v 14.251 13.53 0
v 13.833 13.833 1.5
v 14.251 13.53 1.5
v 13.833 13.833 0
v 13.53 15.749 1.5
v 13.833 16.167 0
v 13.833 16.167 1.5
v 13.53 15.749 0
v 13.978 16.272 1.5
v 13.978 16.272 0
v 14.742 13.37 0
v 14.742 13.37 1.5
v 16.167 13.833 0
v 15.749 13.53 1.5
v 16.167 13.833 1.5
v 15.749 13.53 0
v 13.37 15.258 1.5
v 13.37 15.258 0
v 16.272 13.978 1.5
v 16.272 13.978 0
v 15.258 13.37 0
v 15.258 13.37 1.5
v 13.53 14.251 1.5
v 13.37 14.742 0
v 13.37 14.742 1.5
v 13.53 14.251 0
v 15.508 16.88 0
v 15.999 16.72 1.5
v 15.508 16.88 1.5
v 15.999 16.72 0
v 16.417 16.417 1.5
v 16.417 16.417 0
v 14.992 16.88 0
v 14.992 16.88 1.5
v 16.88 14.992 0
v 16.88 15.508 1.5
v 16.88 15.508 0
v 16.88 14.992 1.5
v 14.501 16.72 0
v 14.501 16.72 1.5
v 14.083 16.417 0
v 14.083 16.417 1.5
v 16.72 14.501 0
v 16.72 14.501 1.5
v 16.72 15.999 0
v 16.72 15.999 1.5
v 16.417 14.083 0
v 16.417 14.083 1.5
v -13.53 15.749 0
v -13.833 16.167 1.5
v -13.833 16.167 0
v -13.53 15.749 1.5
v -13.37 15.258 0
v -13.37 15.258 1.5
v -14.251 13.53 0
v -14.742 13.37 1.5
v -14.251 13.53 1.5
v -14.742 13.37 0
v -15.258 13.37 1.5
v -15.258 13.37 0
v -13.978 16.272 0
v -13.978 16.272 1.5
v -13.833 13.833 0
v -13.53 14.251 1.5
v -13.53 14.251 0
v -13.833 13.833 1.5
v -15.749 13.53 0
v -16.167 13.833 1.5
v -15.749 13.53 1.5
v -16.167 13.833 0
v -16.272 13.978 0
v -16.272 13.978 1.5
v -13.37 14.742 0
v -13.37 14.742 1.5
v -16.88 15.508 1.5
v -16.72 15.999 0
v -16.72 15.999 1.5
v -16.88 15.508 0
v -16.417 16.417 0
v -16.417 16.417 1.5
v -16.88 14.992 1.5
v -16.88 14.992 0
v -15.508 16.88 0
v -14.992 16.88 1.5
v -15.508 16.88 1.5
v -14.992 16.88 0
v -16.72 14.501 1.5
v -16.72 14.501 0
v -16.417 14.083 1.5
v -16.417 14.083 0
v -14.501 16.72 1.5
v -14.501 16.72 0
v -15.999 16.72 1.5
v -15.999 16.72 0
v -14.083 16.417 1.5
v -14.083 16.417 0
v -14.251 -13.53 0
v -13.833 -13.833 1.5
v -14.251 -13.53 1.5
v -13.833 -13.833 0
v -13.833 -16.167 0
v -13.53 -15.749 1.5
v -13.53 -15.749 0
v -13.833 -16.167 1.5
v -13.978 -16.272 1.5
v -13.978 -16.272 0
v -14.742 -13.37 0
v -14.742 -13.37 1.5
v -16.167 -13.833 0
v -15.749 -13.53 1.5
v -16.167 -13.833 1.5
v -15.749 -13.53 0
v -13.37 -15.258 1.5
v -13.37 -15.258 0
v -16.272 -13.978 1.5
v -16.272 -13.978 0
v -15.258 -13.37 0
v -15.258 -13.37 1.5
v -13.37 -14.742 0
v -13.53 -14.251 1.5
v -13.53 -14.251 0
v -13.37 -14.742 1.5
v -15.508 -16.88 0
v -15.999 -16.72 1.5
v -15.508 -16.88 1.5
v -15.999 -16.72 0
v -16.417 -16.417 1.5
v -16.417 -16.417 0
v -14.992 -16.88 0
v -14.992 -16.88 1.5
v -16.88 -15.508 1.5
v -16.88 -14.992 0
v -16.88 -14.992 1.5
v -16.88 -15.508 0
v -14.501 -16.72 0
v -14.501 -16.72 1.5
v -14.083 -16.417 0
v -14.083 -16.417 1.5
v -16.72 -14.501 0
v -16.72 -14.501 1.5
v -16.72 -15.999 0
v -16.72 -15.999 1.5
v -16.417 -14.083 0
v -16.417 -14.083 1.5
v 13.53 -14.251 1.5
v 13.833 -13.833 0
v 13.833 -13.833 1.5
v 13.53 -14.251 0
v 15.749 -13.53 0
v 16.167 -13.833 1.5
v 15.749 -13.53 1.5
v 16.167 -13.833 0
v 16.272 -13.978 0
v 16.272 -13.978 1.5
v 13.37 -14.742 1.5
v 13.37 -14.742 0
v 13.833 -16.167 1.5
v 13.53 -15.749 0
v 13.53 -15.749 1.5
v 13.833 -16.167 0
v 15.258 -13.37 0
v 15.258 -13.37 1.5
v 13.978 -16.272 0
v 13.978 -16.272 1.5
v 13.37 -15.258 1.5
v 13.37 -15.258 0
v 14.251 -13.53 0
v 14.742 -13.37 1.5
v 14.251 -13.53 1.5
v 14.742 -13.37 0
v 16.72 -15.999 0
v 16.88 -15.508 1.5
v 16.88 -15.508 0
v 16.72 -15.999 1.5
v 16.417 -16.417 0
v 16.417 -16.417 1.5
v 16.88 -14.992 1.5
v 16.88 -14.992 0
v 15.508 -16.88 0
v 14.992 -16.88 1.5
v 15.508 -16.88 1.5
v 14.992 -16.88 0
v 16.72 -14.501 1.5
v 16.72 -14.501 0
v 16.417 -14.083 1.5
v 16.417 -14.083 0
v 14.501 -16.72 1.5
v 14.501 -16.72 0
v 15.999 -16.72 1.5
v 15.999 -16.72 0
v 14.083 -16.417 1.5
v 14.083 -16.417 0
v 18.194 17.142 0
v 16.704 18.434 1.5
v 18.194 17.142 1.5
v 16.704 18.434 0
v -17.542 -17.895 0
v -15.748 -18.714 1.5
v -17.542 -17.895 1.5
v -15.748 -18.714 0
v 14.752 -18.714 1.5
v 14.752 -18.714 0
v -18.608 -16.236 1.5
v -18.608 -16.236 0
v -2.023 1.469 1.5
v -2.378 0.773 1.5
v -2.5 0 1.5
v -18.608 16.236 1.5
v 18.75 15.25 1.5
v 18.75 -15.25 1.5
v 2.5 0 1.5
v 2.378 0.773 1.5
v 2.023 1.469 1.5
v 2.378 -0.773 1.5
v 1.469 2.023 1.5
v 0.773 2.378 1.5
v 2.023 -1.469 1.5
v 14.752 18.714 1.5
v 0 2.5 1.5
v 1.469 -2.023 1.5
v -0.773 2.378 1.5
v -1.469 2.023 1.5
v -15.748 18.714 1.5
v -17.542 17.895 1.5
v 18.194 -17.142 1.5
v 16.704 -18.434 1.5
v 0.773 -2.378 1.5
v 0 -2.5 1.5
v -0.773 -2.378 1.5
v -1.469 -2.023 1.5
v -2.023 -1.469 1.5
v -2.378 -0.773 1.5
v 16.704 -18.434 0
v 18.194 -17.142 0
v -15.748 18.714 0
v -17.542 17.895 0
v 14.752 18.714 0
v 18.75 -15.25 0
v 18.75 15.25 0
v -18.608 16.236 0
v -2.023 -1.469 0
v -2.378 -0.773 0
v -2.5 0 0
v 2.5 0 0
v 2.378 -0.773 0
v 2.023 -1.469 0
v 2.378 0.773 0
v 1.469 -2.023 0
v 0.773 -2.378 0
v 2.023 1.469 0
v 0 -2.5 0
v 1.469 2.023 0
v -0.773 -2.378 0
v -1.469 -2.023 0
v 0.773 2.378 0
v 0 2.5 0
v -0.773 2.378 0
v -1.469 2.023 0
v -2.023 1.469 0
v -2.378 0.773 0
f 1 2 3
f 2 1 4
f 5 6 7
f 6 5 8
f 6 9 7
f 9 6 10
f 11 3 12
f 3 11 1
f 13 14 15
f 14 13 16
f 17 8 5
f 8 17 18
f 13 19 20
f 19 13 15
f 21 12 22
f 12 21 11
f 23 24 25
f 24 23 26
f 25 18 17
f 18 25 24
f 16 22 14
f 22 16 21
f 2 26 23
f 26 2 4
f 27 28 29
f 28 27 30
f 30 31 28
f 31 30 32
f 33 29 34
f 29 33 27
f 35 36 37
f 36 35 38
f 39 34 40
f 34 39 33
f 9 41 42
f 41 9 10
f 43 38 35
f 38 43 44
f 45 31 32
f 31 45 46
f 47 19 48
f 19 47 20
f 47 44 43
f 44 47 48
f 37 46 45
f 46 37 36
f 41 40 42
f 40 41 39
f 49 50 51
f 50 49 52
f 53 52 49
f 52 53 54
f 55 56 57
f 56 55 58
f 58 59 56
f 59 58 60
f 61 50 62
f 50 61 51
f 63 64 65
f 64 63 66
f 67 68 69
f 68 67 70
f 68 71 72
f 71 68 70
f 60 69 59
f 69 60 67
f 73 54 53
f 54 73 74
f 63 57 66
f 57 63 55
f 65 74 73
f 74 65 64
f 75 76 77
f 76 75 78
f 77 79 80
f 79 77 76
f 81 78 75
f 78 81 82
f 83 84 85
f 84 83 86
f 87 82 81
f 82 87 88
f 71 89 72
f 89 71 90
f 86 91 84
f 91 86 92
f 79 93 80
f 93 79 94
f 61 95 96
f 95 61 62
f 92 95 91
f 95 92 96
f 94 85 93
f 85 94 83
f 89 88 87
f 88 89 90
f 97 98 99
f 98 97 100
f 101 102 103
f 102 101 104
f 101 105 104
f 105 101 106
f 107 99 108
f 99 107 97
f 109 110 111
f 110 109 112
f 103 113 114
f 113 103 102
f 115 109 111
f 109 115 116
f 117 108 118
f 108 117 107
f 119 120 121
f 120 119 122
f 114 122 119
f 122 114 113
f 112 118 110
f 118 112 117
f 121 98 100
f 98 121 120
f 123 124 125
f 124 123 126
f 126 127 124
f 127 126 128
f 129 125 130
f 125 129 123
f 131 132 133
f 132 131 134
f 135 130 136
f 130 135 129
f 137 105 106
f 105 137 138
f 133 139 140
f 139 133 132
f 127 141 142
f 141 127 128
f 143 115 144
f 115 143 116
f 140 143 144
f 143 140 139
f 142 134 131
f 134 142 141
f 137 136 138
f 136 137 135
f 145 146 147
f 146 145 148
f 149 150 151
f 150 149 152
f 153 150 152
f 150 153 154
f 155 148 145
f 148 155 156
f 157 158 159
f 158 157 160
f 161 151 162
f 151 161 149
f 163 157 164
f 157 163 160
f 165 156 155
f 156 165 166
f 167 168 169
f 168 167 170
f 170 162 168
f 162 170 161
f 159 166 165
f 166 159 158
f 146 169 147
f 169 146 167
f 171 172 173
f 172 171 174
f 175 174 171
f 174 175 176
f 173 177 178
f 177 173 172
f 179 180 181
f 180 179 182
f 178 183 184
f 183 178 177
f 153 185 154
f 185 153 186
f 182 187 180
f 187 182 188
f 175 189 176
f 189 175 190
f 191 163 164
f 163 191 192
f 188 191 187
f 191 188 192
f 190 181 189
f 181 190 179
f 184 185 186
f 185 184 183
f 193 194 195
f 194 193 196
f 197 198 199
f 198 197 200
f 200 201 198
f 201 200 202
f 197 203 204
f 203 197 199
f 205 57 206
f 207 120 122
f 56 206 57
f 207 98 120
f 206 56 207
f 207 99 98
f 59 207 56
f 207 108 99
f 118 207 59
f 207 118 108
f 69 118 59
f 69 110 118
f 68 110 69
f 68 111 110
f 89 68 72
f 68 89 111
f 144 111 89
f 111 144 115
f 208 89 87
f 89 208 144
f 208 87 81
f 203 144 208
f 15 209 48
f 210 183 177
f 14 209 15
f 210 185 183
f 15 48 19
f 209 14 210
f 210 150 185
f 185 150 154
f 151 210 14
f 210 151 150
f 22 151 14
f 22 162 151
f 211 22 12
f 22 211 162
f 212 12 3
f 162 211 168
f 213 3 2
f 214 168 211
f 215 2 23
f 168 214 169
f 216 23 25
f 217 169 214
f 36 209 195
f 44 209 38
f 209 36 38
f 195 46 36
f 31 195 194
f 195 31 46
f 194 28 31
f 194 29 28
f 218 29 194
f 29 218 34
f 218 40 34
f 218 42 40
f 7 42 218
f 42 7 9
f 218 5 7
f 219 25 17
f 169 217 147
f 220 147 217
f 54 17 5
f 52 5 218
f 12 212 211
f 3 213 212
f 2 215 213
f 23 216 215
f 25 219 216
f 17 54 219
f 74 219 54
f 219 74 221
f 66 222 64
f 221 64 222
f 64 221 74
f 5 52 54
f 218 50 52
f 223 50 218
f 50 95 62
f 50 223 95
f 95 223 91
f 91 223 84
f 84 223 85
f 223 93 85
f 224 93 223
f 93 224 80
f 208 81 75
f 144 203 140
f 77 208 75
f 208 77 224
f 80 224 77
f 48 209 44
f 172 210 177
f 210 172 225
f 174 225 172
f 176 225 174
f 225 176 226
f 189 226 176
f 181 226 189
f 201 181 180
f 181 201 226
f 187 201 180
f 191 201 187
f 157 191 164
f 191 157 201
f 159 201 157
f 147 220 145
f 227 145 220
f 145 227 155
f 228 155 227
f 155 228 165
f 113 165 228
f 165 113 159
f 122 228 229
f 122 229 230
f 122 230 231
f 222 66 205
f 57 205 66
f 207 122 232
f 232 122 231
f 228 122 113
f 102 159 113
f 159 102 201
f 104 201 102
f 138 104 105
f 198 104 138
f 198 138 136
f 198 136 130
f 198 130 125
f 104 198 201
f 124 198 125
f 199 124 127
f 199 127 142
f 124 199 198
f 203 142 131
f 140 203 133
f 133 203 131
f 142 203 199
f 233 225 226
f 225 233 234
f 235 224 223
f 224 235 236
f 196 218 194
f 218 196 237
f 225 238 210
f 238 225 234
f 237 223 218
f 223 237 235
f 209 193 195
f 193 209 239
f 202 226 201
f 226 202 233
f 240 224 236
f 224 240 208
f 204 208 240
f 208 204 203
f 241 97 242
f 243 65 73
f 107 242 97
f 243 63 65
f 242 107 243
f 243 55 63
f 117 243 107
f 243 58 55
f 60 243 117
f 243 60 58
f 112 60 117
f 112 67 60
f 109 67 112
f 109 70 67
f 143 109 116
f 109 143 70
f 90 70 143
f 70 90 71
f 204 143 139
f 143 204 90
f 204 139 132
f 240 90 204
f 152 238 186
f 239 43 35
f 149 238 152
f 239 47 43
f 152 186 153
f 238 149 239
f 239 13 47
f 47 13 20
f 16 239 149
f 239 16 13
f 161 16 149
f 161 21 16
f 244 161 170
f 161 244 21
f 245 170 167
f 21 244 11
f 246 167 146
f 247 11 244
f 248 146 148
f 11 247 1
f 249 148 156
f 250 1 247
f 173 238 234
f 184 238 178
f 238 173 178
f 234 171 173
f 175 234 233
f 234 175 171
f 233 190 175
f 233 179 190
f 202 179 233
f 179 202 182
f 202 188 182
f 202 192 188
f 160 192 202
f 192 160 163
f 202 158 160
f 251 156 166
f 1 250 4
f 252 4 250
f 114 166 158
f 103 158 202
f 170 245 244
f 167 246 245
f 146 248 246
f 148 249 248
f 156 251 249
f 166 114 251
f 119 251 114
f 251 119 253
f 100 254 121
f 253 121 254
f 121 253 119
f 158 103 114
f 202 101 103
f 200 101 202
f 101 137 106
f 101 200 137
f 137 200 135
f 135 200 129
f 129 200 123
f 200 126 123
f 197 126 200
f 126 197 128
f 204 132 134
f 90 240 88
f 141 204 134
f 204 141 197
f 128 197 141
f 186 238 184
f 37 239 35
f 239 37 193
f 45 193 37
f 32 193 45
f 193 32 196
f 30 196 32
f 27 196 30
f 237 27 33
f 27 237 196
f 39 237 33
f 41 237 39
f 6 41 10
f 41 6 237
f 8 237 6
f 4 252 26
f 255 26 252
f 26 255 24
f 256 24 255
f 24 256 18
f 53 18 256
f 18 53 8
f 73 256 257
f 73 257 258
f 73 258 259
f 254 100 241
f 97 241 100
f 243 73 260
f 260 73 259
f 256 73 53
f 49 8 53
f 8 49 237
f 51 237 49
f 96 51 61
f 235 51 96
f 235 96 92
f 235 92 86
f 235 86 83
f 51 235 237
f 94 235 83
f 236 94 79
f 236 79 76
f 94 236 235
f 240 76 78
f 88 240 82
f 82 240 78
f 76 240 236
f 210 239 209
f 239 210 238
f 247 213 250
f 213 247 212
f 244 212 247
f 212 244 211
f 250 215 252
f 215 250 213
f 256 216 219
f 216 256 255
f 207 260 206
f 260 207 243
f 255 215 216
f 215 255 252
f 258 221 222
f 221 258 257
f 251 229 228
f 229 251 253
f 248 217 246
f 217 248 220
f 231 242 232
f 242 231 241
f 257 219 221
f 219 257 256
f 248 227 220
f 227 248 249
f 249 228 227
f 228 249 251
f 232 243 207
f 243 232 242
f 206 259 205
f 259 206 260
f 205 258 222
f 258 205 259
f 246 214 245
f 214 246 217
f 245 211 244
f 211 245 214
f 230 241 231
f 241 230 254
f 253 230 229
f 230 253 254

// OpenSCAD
// file: dronePlates.scad
/**
 * dronePlates.scad
 * Plate library
 *
 * GNU GPL V3
 * @author: Victor Potenciano
 */

m3Rad = 3.4/2;
cornerR = 4;

/**
 *
 */
module helperDisk(diameter) {
	cylinder(r = diameter/2, h = 0.6, $fn=20);
}

/**
 *
 */
module roundedRect(size, radius) {
	x = size[0];
	y = size[1];
	z = size[2];

	linear_extrude(height=z)
	hull() {
	// place 4 circles in the corners, with the given radius
	translate([(-x/2)+(radius/2), (-y/2)+(radius/2), 0]){ circle(r=radius); }
	translate([(x/2)-(radius/2), (-y/2)+(radius/2), 0]){ circle(r=radius); }
	translate([(-x/2)+(radius/2), (y/2)-(radius/2), 0]){ circle(r=radius); }
	translate([(x/2)-(radius/2), (y/2)-(radius/2), 0]){ circle(r=radius); }
	}
}

/**
 * rounded rectangle triangle with corner at origin
 */
module roundedTriangle(size, radius) {
	x = size[0];
	y = size[1];
	z = size[2];

	linear_extrude(height=z)
	hull() {
	translate([radius, radius, 0]){ circle(r=radius); }
	translate([x-radius, radius, 0]){ circle(r=radius); }
	translate([radius, y-radius, 0]){ circle(r=radius); }
	}
}

/**
 *
 */
module roundRectPlate(w, l, plateThick=3) {
	difference(){
		roundedRect([l+m3Rad*1.75,w+m3Rad*1.75,plateThick], cornerR);
		translate([l/2, w/2, -0.5]) { cylinder(h = plateThick+1, r = m3Rad, $fn=30); }
		translate([-l/2, w/2, -0.5]) { cylinder(h = plateThick+1, r = m3Rad, $fn=30); }
		translate([l/2, -w/2, -0.5]) { cylinder(h = plateThick+1, r = m3Rad, $fn=30); }
		translate([-l/2, -w/2, -0.5]) { cylinder(h = plateThick+1, r = m3Rad, $fn=30); }
	}
}

/**
 *
 */
module crossSquarePlate(l, thick=3) {
	inDist = cornerR*2+4;
	trianL = sqrt((l*l)/2)-inDist;
	centerR = 4;

	difference(){
		roundRectPlate(l, l, thick);
		translate([0, centerR, -0.5]) { 
			rotate([0,0,45]){ roundedTriangle([trianL,trianL,thick+1], cornerR-2); }
		}
		translate([0, -centerR, -0.5]) { 
			rotate([0,0,225]){ roundedTriangle([trianL,trianL,thick+1], cornerR-2); }
		}
		translate([-centerR, 0, -0.5]) { 
			rotate([0,0,135]){ roundedTriangle([trianL,trianL,thick+1], cornerR-2); }
		}
		translate([centerR, 0, -0.5]) { 
			rotate([0,0,-45]){ roundedTriangle([trianL,trianL,thick+1], cornerR-2); }
		}
	}
}

/**
 *
 */
module hShapePlate(w, l, thick=4) {
	inDist = cornerR*2+1;

	difference(){
		roundRectPlate(w, l, thick);
		translate([0, w/4, -0.5]) { roundedRect([l-inDist,w/2-inDist,thick+1], cornerR-2); }
		translate([0, -w/4, -0.5]) { roundedRect([l-inDist,w/2-inDist,thick+1], cornerR-2); }
	}
}

/**
 *
 */
module motorCircleMount(inDia, outDia, thick=3, extraH=false, d1=19, d2=16, holeR=m3Rad ) {
	difference(){
		cylinder(h = thick, r = outDia/2, $fn=30);
		motorCircleMountHoles(inDia, outDia, thick, extraH, d1=d1, d2=d2, holeR=holeR);
	}
}

/**
 *
 */
module motorCircleMountHoles(inDia, outDia, thick=3, extraH=false, d1=19, d2=16, d3=25, holeR=m3Rad) {
	translate([0, 0, -0.5]) { cylinder(h = thick+1, r = inDia/2, $fn=30); }

	for(i=[0:3]) {
		rotate([0,0,90*i]){
		translate([d1/2, 0, -0.5]) cylinder(h = thick+1, r = holeR, $fn=20);
		translate([d2/2, 0, -0.5]) cylinder(h = thick+1, r = holeR, $fn=20);
		translate([d2/2, -holeR, -0.5]) cube(size = [(d1-d2)/2,holeR*2,thick+1]);
		}
	}
	
	if(extraH==true){	
		for(i=[-1,1]) translate([i*d3/2, 0, -0.5]) { cylinder(h = thick+1, r = holeR, $fn=30); }
	}
}

/**
 *
 */
module motorRectMount(w, l, inDia, thick=3) {
	d1=19;
	d2=16;

	difference(){
		roundRectPlate(w, l, thick);
		translate([0, 0, -0.5]) { cylinder(h = thick+1, r = inDia/2, $fn=30); }
		translate([0, d1/2, -0.5]) { cylinder(h = thick+1, r = m3Rad, $fn=30); }
		translate([0, -d1/2, -0.5]) { cylinder(h = thick+1, r = m3Rad, $fn=30); }
		translate([d2/2, 0, -0.5]) { cylinder(h = thick+1, r = m3Rad, $fn=30); }
		translate([-d2/2, 0, -0.5]) { cylinder(h = thick+1, r = m3Rad, $fn=30); }
	}
}

/**
 *
 */
module tube(inDia, outDia, height) {
	difference(){
		cylinder(h = height, r = outDia/2, $fn=50);
		translate([0, 0, -0.5]) { cylinder(h = height+1, r = inDia/2, $fn=30); }
	}
}

/**
 *
 */
module squareTube(inDia, outDia, height) {
	translate([0,0,height/2]){
	difference(){
		cube(size = [outDia,outDia,height], center = true);
		cube(size = [inDia,inDia,height+1], center = true);
	}
	}
}

/**
 *
 */
module djiFlamewheelHoles(height) {
	a = 23;
	b = 16;
	c = 19.5;
	
	translate([a/2, c/2, 0]) { cylinder(h = height, r = m3Rad, $fn=30); }
	translate([-a/2, c/2, 0]) { cylinder(h = height, r = m3Rad, $fn=30); }
	translate([b/2, -c/2, 0]) { cylinder(h = height, r = m3Rad, $fn=30); }
	translate([-b/2, -c/2, 0]) { cylinder(h = height, r = m3Rad, $fn=30); }
}

/**
 *
 */
module djiFlamewheelHolesBotton(height) {
	a1 = 21;
	c = 19.5;
	
	translate([a1/2, c/2, 0]) { cylinder(h = height, r = m3Rad, $fn=30); }
	translate([-a1/2, c/2, 0]) { cylinder(h = height, r = m3Rad, $fn=30); }
}

/**
 *
 */
module propeller(size){
union(){
difference(){
	cylinder(h = 3, r = size/2, center=true, $fn=30);
	cylinder(h = 3.1, r = size/2-2, center=true, $fn=30); 
}
for( i = [-1,1] ){
rotate([0,0,45*i]){ cube(size = [size,4,1], center = true); }
}
}
}

/**
 *
 */
module slot(length, height, rad){
for(i=[-1,1]) translate([i*length/2,0,0]) cylinder(h = height, r = rad, $fn=30);
translate([0,0,height/2]) cube(size = [length,rad*2,height], center = true);
}

 

////////////////////////
// Examples:
////////////////////////

motorCircleMount(8, 25, 3.5);

//roundedRect([50,50,3], 4);

//hShapePlate(79, 25);

//rotate([0,0,45]){roundedTriangle([40,40,3], 4);}

//crossSquarePlate(45, 4);

/*
union(){
motorRectMount(21, 18, 8, 4);
translate([9, 10.5, 0]) {tube(m3Rad*2, 6.5, 6);}
}
*/

/*
difference(){
union(){
hShapePlate(50, 30, 3.5);
translate([-4,-25,0]){cube(size = [8,50,3.5]);}
rotate([0, 0, 45]) {motorCircleMount(8, 35, 3.5);}
}
cylinder(h = 10, r = 4, $fn=100, center=true);
}
*/

//rotate([90,0,0]){ tube(5,10,20); }
//translate([20,0,0]){ squareTube(5, 10, 20); }
// main file
/**
 *
 */ 
use <dronePlates.scad>

m3Rad = 3.3/2;
thick = 1.5;
d1 = sqrt(2*30*30);
d2 = sqrt(2*30.5*30.5);

difference(){
    roundedRect([34,34,thick],3.5);
    
    rotate([0,0,45]) motorCircleMountHoles(0, 36, thick=thick, d1=d1, d2=d2, holeR=m3Rad);
    
    cylinder(r=2.5, h=thick*3, $fn=20, center=true);
}
